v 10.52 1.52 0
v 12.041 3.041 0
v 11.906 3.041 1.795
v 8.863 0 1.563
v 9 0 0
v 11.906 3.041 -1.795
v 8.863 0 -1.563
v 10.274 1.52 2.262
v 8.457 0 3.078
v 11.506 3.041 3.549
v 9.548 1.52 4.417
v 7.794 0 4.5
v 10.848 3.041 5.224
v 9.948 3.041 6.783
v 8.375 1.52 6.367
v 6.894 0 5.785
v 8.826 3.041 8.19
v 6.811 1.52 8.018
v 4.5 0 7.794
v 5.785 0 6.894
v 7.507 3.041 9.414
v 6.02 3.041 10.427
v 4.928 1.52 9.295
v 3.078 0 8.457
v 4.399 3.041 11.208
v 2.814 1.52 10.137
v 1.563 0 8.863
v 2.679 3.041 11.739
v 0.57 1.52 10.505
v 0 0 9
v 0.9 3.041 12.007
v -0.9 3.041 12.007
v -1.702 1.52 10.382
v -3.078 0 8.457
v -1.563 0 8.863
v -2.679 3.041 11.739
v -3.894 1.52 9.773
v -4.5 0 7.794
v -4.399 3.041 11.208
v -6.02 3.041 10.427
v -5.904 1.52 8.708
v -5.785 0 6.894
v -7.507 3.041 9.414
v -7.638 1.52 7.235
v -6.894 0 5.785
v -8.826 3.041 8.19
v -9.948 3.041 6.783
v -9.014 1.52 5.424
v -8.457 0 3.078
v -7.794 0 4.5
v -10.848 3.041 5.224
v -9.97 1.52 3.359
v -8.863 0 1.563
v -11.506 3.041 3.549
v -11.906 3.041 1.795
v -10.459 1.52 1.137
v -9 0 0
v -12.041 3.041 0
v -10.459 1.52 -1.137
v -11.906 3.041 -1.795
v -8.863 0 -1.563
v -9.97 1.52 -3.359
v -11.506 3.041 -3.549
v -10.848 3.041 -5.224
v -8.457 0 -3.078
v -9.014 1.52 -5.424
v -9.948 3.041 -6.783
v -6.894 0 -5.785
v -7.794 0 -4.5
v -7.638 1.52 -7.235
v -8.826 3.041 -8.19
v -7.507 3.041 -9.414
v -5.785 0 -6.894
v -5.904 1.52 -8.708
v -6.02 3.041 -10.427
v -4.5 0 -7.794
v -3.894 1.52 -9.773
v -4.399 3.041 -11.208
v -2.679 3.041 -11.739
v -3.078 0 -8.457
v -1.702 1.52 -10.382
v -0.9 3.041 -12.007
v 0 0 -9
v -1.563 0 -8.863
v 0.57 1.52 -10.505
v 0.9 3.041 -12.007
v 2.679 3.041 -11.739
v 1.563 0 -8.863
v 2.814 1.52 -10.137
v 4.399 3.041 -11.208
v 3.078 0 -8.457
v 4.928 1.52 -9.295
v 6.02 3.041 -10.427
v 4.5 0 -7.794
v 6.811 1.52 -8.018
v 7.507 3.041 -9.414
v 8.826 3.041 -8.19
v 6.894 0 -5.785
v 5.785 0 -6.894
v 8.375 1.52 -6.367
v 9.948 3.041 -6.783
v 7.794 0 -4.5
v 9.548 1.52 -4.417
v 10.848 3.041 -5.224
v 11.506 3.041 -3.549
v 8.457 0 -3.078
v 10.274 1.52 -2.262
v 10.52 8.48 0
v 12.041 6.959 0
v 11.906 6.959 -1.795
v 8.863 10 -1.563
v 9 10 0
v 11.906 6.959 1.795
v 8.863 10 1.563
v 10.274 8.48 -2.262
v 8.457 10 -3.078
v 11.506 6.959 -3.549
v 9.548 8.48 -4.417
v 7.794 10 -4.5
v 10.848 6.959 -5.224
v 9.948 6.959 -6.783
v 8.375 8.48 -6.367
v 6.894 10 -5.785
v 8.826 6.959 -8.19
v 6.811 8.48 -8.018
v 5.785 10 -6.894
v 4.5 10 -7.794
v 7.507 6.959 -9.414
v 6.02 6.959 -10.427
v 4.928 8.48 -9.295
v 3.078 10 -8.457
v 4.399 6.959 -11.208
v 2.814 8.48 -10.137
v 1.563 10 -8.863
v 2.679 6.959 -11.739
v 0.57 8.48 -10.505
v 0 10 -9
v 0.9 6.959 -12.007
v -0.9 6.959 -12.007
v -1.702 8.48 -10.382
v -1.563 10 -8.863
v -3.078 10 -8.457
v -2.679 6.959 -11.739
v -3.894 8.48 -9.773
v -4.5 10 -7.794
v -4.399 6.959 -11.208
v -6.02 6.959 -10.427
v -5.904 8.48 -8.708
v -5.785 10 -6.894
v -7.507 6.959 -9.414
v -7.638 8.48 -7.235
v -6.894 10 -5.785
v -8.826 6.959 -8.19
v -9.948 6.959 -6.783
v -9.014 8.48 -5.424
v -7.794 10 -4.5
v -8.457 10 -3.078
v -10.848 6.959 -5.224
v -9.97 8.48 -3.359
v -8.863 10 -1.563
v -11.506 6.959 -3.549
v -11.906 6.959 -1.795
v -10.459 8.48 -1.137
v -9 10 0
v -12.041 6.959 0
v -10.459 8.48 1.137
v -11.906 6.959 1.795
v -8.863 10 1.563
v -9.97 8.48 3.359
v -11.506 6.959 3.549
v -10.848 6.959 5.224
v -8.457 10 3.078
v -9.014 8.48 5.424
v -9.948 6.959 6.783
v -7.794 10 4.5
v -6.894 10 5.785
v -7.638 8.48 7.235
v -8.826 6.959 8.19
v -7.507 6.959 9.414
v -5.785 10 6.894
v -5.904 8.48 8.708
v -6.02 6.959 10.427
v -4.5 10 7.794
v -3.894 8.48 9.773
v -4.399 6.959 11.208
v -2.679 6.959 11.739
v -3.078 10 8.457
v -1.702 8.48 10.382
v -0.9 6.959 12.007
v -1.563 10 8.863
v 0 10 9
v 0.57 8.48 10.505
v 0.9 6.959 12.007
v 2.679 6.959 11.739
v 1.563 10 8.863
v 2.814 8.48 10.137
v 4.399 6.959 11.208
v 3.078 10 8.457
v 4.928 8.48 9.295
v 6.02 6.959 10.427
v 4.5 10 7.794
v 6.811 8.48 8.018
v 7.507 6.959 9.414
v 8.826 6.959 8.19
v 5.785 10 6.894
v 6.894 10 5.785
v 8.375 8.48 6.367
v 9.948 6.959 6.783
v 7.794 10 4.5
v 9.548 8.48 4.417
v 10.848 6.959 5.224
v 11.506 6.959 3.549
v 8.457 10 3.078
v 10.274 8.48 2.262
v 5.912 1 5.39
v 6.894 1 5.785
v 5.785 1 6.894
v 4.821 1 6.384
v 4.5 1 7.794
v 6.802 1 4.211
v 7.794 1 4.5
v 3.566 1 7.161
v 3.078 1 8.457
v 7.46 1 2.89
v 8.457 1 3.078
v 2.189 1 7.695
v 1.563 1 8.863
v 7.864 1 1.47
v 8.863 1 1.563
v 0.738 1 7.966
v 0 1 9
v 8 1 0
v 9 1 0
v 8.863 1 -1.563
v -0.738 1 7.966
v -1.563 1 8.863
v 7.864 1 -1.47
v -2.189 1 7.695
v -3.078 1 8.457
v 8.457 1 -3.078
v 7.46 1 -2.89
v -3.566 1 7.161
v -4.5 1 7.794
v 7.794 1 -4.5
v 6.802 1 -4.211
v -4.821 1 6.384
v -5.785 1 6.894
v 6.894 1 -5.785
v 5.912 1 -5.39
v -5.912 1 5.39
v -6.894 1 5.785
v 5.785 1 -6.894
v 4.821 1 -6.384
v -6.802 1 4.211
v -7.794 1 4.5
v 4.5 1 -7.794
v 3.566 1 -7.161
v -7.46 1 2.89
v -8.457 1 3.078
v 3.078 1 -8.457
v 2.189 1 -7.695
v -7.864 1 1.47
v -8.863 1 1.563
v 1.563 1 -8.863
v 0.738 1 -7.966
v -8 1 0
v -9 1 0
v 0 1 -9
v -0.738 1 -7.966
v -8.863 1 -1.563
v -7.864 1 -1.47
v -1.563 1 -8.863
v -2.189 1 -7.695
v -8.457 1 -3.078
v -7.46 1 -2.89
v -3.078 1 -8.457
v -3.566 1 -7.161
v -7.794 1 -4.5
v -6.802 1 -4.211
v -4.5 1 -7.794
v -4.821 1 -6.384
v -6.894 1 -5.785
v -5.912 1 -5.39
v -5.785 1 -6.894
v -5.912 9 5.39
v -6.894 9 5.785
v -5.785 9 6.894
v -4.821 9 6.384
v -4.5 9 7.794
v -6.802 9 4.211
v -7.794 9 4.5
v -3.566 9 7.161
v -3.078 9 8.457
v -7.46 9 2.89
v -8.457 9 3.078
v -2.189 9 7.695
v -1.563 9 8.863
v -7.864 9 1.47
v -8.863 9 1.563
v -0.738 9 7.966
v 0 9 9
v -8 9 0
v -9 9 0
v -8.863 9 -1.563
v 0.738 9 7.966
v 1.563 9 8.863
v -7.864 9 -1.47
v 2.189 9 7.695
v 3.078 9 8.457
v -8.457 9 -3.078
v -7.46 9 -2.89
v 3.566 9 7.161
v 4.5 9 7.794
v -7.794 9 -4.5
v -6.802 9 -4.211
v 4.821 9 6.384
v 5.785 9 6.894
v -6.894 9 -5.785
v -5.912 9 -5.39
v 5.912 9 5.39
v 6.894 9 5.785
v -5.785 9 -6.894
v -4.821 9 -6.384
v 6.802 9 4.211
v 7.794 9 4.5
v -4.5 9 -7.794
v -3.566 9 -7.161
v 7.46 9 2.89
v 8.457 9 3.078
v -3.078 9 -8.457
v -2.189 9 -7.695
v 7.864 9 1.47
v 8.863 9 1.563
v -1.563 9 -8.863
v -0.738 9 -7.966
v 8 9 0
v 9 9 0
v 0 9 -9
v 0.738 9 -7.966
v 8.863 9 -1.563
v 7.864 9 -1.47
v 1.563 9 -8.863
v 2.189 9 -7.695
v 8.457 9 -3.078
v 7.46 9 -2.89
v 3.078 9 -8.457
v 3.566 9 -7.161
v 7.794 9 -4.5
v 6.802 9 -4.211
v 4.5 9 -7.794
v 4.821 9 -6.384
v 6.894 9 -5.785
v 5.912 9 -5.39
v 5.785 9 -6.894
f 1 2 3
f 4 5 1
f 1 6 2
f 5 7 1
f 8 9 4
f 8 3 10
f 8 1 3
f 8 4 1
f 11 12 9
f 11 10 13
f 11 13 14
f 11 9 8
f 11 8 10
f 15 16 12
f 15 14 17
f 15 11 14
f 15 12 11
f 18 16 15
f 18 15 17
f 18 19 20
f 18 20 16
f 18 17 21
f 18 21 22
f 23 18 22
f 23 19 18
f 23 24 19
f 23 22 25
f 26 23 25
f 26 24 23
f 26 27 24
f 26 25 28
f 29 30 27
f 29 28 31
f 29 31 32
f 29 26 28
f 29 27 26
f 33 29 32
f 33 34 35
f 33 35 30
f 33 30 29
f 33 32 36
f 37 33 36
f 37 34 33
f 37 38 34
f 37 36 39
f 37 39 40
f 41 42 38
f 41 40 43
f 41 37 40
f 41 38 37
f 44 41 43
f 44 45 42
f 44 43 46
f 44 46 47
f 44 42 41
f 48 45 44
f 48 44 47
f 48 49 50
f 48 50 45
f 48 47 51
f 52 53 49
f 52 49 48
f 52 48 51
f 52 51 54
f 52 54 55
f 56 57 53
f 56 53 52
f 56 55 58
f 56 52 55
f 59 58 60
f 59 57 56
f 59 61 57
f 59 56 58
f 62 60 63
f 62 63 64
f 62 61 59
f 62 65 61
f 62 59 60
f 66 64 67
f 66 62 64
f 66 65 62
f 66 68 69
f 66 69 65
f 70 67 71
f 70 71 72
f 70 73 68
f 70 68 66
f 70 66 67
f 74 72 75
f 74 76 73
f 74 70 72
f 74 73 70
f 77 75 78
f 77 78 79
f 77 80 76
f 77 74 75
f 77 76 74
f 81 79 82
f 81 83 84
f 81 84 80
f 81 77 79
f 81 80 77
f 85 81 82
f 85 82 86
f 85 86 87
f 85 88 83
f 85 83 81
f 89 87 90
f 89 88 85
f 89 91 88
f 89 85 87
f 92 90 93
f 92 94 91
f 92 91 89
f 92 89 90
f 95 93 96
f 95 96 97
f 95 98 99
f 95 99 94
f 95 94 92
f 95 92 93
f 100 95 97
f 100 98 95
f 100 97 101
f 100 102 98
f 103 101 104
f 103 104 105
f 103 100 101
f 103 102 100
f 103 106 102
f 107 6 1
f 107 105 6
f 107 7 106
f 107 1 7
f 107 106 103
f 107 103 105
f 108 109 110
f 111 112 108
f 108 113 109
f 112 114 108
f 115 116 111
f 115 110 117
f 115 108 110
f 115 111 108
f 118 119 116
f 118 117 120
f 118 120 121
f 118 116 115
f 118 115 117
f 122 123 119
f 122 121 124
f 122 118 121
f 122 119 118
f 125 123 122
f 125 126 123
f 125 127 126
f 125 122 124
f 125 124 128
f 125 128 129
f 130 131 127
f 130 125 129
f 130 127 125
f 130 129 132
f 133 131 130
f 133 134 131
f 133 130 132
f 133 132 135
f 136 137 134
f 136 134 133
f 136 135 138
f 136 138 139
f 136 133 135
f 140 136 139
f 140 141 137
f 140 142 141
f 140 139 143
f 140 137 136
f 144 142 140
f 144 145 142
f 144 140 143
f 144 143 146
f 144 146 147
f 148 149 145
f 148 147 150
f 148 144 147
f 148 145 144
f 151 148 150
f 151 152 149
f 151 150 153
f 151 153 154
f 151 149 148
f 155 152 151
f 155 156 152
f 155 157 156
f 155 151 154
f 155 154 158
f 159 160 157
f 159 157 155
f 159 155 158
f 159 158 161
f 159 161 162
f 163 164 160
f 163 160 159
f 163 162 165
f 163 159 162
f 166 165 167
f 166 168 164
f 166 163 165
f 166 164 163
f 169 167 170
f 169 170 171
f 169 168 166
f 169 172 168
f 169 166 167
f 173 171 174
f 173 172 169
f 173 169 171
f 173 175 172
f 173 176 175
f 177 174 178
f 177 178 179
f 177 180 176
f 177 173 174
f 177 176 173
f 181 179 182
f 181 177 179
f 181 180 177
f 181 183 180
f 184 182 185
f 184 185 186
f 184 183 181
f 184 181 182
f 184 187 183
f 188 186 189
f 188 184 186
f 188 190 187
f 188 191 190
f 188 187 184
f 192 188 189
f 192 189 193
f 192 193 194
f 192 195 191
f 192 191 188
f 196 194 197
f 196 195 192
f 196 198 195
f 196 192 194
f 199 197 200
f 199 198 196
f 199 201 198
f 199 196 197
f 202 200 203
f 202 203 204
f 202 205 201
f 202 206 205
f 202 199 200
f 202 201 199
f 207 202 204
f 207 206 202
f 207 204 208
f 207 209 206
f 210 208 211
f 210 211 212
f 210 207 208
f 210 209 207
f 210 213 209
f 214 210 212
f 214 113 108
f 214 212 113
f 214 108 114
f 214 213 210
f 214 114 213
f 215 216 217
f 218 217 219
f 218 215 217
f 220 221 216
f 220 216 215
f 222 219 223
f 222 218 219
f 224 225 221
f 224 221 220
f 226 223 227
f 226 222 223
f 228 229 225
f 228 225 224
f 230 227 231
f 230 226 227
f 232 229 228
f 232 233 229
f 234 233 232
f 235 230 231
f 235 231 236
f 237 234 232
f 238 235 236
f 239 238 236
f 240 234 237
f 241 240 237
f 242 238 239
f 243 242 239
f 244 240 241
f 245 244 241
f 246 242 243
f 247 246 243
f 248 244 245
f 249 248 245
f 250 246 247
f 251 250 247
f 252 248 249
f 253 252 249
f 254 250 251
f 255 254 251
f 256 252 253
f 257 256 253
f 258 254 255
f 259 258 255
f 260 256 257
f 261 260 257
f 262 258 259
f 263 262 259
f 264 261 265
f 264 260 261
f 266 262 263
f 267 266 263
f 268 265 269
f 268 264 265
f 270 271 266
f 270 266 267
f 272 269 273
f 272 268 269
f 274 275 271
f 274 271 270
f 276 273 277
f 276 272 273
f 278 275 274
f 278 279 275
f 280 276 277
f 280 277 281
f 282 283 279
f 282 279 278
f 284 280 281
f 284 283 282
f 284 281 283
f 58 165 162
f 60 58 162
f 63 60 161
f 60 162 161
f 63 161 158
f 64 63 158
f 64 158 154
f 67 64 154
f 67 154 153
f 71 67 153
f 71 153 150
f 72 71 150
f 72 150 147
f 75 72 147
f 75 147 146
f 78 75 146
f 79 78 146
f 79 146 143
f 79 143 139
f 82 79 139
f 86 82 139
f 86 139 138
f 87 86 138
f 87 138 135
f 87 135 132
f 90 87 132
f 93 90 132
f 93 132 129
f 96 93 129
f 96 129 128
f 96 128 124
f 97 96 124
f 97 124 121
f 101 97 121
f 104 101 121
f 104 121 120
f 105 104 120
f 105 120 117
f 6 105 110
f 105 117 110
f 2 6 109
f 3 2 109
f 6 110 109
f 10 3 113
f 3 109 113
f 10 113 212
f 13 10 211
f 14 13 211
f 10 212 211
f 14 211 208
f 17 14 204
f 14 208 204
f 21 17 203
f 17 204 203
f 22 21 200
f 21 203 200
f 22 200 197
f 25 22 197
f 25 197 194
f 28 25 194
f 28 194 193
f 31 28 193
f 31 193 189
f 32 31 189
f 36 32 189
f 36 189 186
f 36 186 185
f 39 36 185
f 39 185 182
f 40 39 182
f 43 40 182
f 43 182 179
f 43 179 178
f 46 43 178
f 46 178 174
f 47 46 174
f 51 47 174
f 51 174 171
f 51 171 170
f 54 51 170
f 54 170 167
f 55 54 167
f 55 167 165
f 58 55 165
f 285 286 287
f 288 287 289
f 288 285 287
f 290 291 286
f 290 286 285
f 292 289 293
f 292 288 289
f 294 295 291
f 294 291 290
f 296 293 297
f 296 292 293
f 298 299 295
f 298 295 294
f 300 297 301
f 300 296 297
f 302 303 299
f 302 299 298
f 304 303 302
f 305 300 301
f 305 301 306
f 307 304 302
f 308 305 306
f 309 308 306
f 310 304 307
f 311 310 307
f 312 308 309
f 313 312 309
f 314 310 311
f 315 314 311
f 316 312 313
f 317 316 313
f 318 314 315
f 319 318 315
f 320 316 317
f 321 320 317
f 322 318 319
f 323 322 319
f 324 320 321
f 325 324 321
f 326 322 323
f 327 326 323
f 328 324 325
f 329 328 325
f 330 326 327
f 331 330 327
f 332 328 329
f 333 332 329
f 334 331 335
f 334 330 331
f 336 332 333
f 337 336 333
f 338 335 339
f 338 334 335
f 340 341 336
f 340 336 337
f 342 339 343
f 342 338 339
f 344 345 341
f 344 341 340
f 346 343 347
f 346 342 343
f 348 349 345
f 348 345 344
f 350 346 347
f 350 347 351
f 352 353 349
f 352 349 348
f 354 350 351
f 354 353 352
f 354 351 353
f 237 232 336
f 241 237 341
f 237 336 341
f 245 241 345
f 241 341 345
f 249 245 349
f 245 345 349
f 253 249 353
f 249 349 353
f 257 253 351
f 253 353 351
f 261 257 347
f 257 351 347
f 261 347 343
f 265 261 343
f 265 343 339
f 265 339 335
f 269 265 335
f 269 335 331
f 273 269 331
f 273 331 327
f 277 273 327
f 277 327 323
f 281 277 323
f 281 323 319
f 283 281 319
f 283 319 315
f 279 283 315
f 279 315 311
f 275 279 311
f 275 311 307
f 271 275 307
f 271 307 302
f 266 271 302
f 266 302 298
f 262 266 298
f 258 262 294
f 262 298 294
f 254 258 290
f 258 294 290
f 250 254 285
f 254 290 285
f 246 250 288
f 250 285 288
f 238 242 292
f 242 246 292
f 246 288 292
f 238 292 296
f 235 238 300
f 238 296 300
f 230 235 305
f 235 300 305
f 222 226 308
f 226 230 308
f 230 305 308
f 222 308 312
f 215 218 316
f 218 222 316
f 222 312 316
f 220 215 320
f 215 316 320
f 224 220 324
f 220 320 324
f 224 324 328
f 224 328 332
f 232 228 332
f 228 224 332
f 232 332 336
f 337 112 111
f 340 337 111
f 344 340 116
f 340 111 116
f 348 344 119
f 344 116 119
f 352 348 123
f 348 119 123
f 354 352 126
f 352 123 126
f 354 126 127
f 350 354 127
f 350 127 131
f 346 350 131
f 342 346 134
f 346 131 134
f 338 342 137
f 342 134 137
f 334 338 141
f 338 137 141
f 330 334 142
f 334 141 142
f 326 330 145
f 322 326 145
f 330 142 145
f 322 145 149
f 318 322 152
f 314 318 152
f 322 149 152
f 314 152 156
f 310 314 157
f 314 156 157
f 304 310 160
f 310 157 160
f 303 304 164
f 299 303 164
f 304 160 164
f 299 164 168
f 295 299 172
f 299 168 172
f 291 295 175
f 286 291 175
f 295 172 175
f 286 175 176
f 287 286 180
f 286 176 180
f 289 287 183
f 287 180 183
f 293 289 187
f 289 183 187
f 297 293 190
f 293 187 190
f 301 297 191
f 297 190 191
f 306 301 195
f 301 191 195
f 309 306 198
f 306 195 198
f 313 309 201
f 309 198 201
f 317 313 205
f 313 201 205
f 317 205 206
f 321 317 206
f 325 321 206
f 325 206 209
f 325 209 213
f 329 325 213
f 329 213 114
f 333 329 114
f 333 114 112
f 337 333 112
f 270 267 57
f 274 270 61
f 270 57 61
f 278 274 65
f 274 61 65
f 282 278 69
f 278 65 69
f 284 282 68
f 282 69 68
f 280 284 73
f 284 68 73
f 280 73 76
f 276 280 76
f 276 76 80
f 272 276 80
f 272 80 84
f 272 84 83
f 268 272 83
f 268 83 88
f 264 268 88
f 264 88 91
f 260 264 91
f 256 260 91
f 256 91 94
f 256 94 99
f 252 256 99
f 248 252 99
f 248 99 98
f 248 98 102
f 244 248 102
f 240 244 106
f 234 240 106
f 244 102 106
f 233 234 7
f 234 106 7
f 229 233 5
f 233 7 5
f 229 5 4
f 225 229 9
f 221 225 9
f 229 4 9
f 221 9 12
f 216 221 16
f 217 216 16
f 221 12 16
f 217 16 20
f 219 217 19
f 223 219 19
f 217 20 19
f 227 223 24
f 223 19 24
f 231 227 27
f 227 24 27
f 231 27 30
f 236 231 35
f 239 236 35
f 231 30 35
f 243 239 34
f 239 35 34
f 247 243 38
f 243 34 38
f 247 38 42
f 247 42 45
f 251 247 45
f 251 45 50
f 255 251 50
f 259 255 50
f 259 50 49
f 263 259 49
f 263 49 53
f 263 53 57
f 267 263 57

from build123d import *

# Parameters (mm, degrees)
SKETCH1_R           = 9
BOSS_EXTRUDE3_DEPTH = 10
SKETCH54_R          = 12.040559159
BOSS_EXTRUDE5_DEPTH = 3.040559
BOSS_EXTRUDE5_TAPER = 45
SKETCH55_R          = 12.040559159
BOSS_EXTRUDE6_DEPTH = 3.040559
BOSS_EXTRUDE6_TAPER = 45
SKETCH56_R          = 12.040559159
BOSS_EXTRUDE7_DEPTH = 3.918882
SKETCH53_R          = 8
CUT_EXTRUDE7_DEPTH  = 11.0000001
SKETCH57_R          = 9
SKETCH57_R_2        = 8
CUT_EXTRUDE8_DEPTH  = 1
SKETCH59_R          = 9
SKETCH59_R_2        = 8
CUT_EXTRUDE9_DEPTH  = 1


with BuildPart() as part:
    # Sketch1 → Boss-Extrude3 (new body)
    with BuildSketch(Plane(origin=(0, 0, 0), x_dir=(1, 0, 0), z_dir=(0, 1, 0))):
        Circle(SKETCH1_R)
    extrude(amount=BOSS_EXTRUDE3_DEPTH)

    # Sketch54 → Boss-Extrude5 (add)
    with BuildSketch(Plane(origin=(0, 6.959440841, 0), x_dir=(1, 0, 0), z_dir=(0, 1, 0))):
        Circle(SKETCH54_R)
    extrude(amount=BOSS_EXTRUDE5_DEPTH, taper=BOSS_EXTRUDE5_TAPER)

    # Sketch55 → Boss-Extrude6 (add)
    with BuildSketch(Plane.XZ.offset(-3.040559159)):
        Circle(SKETCH55_R)
    extrude(amount=BOSS_EXTRUDE6_DEPTH, taper=BOSS_EXTRUDE6_TAPER)

    # Sketch56 → Boss-Extrude7 (add)
    with BuildSketch(Plane(origin=(0, 6.959440841, 0), x_dir=(-1, 0, 0), z_dir=(0, -1, 0))):
        Circle(SKETCH56_R)
    extrude(amount=BOSS_EXTRUDE7_DEPTH)

    # Sketch53 → Cut-Extrude7 (cut, through all)
    with BuildSketch(Plane(origin=(0, 10, 0), x_dir=(1, 0, 0), z_dir=(0, 1, 0))):
        Circle(SKETCH53_R)
    extrude(amount=-CUT_EXTRUDE7_DEPTH, mode=Mode.SUBTRACT)

    # Sketch57 → Cut-Extrude8 (cut)
    with BuildSketch(Plane(origin=(0, 0, 0), x_dir=(-1, 0, 0), z_dir=(0, -1, 0))):
        Circle(SKETCH57_R)
        Circle(SKETCH57_R_2, mode=Mode.SUBTRACT)
    extrude(amount=-CUT_EXTRUDE8_DEPTH, mode=Mode.SUBTRACT)

    # Sketch59 → Cut-Extrude9 (cut)
    with BuildSketch(Plane(origin=(0, 10, 0), x_dir=(1, 0, 0), z_dir=(0, 1, 0))):
        Circle(SKETCH59_R)
        Circle(SKETCH59_R_2, mode=Mode.SUBTRACT)
    extrude(amount=-CUT_EXTRUDE9_DEPTH, mode=Mode.SUBTRACT)


solid = part.part
